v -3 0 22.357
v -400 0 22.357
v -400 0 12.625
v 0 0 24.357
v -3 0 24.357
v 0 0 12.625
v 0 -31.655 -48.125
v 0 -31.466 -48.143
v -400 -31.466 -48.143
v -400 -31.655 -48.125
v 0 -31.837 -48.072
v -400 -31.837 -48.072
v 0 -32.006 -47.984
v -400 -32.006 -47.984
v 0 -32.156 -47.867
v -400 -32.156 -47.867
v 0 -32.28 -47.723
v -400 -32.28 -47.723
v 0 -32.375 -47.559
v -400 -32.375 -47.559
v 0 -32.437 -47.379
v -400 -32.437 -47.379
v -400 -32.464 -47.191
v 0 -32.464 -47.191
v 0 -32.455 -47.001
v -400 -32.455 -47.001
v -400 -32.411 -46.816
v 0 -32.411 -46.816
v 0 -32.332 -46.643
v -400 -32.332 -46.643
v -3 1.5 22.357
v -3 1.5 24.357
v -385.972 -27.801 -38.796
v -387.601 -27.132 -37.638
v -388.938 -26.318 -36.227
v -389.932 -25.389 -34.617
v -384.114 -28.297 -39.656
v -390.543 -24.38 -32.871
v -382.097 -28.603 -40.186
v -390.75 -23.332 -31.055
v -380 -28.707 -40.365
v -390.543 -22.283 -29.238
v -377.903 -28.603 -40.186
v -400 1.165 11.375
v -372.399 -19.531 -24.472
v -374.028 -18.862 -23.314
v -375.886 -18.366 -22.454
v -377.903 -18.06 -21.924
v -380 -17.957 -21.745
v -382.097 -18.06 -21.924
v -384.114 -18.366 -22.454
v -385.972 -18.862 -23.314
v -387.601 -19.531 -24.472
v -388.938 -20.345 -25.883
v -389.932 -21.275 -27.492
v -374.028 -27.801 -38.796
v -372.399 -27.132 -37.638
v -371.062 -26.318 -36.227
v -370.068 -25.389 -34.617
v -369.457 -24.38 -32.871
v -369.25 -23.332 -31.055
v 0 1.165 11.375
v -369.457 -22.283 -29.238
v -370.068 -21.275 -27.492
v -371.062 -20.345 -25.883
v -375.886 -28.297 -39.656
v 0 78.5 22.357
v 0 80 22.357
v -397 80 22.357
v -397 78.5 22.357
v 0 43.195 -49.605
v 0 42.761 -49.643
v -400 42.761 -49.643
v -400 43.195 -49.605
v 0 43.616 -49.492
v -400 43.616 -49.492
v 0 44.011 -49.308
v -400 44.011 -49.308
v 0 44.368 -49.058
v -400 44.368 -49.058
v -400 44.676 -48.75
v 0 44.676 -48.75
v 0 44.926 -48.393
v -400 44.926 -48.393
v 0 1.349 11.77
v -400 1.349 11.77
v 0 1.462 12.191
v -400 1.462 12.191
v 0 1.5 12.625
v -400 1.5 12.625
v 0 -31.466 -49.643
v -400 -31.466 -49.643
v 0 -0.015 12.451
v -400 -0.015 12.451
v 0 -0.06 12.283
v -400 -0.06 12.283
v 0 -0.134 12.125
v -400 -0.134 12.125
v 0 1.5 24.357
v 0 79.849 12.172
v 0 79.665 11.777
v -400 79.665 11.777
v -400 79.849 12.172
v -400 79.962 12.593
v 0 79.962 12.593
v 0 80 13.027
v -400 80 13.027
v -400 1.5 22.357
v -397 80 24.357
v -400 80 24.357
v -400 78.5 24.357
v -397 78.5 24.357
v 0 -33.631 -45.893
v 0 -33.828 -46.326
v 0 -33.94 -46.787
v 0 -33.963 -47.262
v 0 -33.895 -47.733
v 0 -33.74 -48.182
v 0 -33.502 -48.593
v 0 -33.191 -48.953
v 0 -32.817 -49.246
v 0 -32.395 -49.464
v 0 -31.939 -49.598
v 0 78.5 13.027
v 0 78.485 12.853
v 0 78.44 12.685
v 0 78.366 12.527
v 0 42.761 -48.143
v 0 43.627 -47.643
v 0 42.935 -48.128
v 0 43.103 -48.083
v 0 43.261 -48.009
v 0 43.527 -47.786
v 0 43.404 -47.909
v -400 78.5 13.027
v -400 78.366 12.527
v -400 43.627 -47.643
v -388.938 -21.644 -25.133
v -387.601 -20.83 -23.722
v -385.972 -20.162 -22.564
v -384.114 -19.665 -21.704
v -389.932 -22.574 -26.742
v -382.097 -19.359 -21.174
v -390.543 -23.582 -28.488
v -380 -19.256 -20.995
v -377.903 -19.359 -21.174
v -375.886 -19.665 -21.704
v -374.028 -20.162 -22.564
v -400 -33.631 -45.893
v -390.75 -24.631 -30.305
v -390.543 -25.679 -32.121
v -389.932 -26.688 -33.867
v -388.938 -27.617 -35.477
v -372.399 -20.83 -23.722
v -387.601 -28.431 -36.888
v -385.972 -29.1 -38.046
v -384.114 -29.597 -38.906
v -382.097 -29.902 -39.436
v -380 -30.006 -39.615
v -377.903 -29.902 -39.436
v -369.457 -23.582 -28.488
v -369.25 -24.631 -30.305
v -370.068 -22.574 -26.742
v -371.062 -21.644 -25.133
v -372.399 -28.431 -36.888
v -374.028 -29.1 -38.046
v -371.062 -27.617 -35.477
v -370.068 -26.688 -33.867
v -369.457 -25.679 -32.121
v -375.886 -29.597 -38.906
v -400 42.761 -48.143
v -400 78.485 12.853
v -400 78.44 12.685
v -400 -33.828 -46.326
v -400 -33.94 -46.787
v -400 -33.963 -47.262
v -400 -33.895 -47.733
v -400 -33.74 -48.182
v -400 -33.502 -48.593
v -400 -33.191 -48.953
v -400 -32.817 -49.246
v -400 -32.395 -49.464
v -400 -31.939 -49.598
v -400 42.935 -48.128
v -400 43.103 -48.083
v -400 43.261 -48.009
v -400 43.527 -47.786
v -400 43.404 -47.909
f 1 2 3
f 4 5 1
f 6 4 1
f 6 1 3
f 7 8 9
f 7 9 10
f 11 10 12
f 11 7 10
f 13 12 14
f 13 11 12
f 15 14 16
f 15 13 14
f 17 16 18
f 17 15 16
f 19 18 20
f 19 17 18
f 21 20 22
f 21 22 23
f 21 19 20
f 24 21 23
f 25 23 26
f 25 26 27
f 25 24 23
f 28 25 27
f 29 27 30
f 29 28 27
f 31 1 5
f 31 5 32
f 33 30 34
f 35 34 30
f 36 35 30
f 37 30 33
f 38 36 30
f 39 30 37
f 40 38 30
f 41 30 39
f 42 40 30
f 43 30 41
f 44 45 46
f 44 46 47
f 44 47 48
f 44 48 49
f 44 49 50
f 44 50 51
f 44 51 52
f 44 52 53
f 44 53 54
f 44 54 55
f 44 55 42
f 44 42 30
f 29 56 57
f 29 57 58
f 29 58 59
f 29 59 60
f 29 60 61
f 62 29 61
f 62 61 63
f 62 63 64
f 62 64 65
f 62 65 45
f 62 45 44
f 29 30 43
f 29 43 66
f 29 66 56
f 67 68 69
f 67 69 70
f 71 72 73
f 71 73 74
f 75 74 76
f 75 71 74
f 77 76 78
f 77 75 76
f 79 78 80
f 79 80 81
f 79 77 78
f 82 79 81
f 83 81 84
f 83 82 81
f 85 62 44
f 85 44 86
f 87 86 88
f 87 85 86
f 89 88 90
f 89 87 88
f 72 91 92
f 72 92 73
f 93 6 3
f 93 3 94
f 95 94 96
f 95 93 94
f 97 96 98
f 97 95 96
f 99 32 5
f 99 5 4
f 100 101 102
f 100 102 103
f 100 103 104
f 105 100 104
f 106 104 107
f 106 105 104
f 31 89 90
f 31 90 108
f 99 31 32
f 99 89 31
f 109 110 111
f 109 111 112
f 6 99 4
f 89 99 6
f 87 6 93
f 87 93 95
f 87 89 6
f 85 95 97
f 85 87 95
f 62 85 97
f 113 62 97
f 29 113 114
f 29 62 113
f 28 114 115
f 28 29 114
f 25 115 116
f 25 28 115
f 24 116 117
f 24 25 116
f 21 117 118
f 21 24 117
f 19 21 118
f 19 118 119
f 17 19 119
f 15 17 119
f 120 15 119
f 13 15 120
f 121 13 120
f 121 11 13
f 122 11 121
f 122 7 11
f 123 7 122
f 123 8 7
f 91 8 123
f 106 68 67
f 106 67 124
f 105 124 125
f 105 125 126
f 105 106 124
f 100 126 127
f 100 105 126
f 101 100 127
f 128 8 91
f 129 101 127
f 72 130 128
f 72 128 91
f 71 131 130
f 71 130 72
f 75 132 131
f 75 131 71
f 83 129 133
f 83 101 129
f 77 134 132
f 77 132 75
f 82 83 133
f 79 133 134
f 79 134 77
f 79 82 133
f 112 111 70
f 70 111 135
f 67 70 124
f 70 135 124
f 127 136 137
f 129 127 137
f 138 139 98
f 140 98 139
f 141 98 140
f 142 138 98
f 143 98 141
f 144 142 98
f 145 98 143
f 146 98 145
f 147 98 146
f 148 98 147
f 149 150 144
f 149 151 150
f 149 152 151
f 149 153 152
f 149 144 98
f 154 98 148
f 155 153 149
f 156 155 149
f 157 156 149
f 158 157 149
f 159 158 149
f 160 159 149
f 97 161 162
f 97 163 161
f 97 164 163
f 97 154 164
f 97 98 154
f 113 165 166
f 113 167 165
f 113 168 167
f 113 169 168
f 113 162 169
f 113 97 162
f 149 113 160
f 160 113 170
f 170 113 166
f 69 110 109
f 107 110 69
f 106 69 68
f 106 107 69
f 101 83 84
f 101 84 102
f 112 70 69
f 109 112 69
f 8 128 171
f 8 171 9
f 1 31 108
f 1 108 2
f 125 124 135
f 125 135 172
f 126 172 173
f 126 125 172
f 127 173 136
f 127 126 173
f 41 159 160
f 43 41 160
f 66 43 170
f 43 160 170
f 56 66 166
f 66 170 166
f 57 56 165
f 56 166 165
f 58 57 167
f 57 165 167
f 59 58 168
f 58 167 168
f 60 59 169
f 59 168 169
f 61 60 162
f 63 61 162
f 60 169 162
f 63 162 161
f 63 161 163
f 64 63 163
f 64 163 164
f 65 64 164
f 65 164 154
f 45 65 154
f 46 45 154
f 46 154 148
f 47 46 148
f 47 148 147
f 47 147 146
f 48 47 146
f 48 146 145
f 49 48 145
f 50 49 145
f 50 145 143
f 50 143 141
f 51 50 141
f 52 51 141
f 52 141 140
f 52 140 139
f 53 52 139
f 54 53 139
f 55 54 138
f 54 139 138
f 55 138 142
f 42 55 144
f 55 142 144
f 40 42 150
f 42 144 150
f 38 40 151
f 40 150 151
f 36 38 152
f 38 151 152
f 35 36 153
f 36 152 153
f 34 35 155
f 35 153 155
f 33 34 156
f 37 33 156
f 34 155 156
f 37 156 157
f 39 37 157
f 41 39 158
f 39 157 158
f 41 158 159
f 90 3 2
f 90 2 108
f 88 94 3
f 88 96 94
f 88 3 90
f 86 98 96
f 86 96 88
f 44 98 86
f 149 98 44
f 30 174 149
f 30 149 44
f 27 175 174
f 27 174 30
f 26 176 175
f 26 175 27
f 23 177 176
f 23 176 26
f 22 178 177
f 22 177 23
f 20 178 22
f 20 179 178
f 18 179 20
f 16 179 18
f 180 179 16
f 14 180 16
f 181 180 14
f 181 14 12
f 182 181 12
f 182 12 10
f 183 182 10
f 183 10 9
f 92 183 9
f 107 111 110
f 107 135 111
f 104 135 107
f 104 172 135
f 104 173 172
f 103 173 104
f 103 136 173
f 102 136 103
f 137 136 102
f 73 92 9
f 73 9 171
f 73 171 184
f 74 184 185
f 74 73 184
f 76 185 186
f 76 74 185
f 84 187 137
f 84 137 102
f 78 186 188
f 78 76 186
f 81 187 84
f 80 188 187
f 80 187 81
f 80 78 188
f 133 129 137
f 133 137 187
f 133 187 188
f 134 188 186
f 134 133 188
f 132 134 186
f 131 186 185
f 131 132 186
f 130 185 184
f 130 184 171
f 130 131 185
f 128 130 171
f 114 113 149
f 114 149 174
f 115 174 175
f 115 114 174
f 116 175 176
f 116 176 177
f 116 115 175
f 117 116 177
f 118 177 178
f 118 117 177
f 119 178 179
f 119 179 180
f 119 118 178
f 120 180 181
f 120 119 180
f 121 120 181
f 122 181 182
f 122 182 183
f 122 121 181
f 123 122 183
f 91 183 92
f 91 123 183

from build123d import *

# Parameters (mm, degrees)
SM_BASE_FLANGE_1_DEPTH = 400
SKETCH_7_W             = 3
SKETCH_7_H             = 1.5
EXTRUDE_1_DEPTH        = 2
SKETCH_9_R             = 10.75
CUT_EXTRUDE_2_DEPTH    = 10


# Sheet-metal steps are written as plain solids
with BuildPart() as part:
    # Sketch 1 → Базовая кромка1 (new body)
    with BuildSketch(Plane(origin=(0, 0, 0), x_dir=(0, 0, -1), z_dir=(1, 0, 0))):
        with BuildLine():
            Line((-22.356799498, 0), (-12.62474869, 0))
            ThreePointArc((-12.62474869, 0), (-12.365929645, -0.034074174), (-12.12474869, -0.133974596))
            Line((-12.12474869, -0.133974596), (45.893200502, -33.63065318))
            ThreePointArc((45.893200502, -33.63065318), (48.393200502, -33.63065318), (49.643200502, -31.465589671))
            Line((49.643200502, -31.465589671), (49.643200502, 42.760907637))
            ThreePointArc((49.643200502, 42.760907637), (49.308264012, 44.010907637), (48.393200502, 44.925971147))
            Line((48.393200502, 44.925971147), (-11.776672479, 79.665063509))
            ThreePointArc((-11.776672479, 79.665063509), (-12.379624866, 79.914814566), (-13.026672479, 80))
            Line((-13.026672479, 80), (-22.356799498, 80))
            Line((-22.356799498, 80), (-22.356799498, 78.5))
            Line((-22.356799498, 78.5), (-13.026672479, 78.5))
            ThreePointArc((-13.026672479, 78.5), (-12.767853434, 78.465925826), (-12.526672479, 78.366025404))
            Line((-12.526672479, 78.366025404), (47.643200502, 43.626933041))
            ThreePointArc((47.643200502, 43.626933041), (48.009225906, 43.260907637), (48.143200502, 42.760907637))
            Line((48.143200502, 42.760907637), (48.143200502, -31.465589671))
            ThreePointArc((48.143200502, -31.465589671), (47.643200502, -32.331615075), (46.643200502, -32.331615075))
            Line((46.643200502, -32.331615075), (-11.37474869, 1.165063509))
            ThreePointArc((-11.37474869, 1.165063509), (-11.977701077, 1.414814566), (-12.62474869, 1.5))
            Line((-12.62474869, 1.5), (-22.356799498, 1.5))
            Line((-22.356799498, 1.5), (-22.356799498, 0))
        make_face()
    extrude(amount=-SM_BASE_FLANGE_1_DEPTH)

    # Эскиз7 → Бобышка-Вытянуть1 (add)
    with BuildSketch(Plane.XY.offset(22.356799498)):
        with Locations((-398.5, 79.25)):
            Rectangle(SKETCH_7_W, SKETCH_7_H)
        with Locations((-1.5, 0.75)):
            Rectangle(SKETCH_7_W, SKETCH_7_H)
    extrude(amount=EXTRUDE_1_DEPTH)

    # Эскиз9 → Вырез-Вытянуть2 (cut)
    with BuildSketch(Plane(origin=(0, -5.350651137, 3.089199874), x_dir=(1, 0, 0), z_dir=(0, -0.86602540378444, 0.49999999999999756))):
        with Locations(Location((-380, -38.560004086, 0), (0, 0, 270))):
            Circle(SKETCH_9_R)
    extrude(amount=-CUT_EXTRUDE_2_DEPTH, mode=Mode.SUBTRACT)


solid = part.part
